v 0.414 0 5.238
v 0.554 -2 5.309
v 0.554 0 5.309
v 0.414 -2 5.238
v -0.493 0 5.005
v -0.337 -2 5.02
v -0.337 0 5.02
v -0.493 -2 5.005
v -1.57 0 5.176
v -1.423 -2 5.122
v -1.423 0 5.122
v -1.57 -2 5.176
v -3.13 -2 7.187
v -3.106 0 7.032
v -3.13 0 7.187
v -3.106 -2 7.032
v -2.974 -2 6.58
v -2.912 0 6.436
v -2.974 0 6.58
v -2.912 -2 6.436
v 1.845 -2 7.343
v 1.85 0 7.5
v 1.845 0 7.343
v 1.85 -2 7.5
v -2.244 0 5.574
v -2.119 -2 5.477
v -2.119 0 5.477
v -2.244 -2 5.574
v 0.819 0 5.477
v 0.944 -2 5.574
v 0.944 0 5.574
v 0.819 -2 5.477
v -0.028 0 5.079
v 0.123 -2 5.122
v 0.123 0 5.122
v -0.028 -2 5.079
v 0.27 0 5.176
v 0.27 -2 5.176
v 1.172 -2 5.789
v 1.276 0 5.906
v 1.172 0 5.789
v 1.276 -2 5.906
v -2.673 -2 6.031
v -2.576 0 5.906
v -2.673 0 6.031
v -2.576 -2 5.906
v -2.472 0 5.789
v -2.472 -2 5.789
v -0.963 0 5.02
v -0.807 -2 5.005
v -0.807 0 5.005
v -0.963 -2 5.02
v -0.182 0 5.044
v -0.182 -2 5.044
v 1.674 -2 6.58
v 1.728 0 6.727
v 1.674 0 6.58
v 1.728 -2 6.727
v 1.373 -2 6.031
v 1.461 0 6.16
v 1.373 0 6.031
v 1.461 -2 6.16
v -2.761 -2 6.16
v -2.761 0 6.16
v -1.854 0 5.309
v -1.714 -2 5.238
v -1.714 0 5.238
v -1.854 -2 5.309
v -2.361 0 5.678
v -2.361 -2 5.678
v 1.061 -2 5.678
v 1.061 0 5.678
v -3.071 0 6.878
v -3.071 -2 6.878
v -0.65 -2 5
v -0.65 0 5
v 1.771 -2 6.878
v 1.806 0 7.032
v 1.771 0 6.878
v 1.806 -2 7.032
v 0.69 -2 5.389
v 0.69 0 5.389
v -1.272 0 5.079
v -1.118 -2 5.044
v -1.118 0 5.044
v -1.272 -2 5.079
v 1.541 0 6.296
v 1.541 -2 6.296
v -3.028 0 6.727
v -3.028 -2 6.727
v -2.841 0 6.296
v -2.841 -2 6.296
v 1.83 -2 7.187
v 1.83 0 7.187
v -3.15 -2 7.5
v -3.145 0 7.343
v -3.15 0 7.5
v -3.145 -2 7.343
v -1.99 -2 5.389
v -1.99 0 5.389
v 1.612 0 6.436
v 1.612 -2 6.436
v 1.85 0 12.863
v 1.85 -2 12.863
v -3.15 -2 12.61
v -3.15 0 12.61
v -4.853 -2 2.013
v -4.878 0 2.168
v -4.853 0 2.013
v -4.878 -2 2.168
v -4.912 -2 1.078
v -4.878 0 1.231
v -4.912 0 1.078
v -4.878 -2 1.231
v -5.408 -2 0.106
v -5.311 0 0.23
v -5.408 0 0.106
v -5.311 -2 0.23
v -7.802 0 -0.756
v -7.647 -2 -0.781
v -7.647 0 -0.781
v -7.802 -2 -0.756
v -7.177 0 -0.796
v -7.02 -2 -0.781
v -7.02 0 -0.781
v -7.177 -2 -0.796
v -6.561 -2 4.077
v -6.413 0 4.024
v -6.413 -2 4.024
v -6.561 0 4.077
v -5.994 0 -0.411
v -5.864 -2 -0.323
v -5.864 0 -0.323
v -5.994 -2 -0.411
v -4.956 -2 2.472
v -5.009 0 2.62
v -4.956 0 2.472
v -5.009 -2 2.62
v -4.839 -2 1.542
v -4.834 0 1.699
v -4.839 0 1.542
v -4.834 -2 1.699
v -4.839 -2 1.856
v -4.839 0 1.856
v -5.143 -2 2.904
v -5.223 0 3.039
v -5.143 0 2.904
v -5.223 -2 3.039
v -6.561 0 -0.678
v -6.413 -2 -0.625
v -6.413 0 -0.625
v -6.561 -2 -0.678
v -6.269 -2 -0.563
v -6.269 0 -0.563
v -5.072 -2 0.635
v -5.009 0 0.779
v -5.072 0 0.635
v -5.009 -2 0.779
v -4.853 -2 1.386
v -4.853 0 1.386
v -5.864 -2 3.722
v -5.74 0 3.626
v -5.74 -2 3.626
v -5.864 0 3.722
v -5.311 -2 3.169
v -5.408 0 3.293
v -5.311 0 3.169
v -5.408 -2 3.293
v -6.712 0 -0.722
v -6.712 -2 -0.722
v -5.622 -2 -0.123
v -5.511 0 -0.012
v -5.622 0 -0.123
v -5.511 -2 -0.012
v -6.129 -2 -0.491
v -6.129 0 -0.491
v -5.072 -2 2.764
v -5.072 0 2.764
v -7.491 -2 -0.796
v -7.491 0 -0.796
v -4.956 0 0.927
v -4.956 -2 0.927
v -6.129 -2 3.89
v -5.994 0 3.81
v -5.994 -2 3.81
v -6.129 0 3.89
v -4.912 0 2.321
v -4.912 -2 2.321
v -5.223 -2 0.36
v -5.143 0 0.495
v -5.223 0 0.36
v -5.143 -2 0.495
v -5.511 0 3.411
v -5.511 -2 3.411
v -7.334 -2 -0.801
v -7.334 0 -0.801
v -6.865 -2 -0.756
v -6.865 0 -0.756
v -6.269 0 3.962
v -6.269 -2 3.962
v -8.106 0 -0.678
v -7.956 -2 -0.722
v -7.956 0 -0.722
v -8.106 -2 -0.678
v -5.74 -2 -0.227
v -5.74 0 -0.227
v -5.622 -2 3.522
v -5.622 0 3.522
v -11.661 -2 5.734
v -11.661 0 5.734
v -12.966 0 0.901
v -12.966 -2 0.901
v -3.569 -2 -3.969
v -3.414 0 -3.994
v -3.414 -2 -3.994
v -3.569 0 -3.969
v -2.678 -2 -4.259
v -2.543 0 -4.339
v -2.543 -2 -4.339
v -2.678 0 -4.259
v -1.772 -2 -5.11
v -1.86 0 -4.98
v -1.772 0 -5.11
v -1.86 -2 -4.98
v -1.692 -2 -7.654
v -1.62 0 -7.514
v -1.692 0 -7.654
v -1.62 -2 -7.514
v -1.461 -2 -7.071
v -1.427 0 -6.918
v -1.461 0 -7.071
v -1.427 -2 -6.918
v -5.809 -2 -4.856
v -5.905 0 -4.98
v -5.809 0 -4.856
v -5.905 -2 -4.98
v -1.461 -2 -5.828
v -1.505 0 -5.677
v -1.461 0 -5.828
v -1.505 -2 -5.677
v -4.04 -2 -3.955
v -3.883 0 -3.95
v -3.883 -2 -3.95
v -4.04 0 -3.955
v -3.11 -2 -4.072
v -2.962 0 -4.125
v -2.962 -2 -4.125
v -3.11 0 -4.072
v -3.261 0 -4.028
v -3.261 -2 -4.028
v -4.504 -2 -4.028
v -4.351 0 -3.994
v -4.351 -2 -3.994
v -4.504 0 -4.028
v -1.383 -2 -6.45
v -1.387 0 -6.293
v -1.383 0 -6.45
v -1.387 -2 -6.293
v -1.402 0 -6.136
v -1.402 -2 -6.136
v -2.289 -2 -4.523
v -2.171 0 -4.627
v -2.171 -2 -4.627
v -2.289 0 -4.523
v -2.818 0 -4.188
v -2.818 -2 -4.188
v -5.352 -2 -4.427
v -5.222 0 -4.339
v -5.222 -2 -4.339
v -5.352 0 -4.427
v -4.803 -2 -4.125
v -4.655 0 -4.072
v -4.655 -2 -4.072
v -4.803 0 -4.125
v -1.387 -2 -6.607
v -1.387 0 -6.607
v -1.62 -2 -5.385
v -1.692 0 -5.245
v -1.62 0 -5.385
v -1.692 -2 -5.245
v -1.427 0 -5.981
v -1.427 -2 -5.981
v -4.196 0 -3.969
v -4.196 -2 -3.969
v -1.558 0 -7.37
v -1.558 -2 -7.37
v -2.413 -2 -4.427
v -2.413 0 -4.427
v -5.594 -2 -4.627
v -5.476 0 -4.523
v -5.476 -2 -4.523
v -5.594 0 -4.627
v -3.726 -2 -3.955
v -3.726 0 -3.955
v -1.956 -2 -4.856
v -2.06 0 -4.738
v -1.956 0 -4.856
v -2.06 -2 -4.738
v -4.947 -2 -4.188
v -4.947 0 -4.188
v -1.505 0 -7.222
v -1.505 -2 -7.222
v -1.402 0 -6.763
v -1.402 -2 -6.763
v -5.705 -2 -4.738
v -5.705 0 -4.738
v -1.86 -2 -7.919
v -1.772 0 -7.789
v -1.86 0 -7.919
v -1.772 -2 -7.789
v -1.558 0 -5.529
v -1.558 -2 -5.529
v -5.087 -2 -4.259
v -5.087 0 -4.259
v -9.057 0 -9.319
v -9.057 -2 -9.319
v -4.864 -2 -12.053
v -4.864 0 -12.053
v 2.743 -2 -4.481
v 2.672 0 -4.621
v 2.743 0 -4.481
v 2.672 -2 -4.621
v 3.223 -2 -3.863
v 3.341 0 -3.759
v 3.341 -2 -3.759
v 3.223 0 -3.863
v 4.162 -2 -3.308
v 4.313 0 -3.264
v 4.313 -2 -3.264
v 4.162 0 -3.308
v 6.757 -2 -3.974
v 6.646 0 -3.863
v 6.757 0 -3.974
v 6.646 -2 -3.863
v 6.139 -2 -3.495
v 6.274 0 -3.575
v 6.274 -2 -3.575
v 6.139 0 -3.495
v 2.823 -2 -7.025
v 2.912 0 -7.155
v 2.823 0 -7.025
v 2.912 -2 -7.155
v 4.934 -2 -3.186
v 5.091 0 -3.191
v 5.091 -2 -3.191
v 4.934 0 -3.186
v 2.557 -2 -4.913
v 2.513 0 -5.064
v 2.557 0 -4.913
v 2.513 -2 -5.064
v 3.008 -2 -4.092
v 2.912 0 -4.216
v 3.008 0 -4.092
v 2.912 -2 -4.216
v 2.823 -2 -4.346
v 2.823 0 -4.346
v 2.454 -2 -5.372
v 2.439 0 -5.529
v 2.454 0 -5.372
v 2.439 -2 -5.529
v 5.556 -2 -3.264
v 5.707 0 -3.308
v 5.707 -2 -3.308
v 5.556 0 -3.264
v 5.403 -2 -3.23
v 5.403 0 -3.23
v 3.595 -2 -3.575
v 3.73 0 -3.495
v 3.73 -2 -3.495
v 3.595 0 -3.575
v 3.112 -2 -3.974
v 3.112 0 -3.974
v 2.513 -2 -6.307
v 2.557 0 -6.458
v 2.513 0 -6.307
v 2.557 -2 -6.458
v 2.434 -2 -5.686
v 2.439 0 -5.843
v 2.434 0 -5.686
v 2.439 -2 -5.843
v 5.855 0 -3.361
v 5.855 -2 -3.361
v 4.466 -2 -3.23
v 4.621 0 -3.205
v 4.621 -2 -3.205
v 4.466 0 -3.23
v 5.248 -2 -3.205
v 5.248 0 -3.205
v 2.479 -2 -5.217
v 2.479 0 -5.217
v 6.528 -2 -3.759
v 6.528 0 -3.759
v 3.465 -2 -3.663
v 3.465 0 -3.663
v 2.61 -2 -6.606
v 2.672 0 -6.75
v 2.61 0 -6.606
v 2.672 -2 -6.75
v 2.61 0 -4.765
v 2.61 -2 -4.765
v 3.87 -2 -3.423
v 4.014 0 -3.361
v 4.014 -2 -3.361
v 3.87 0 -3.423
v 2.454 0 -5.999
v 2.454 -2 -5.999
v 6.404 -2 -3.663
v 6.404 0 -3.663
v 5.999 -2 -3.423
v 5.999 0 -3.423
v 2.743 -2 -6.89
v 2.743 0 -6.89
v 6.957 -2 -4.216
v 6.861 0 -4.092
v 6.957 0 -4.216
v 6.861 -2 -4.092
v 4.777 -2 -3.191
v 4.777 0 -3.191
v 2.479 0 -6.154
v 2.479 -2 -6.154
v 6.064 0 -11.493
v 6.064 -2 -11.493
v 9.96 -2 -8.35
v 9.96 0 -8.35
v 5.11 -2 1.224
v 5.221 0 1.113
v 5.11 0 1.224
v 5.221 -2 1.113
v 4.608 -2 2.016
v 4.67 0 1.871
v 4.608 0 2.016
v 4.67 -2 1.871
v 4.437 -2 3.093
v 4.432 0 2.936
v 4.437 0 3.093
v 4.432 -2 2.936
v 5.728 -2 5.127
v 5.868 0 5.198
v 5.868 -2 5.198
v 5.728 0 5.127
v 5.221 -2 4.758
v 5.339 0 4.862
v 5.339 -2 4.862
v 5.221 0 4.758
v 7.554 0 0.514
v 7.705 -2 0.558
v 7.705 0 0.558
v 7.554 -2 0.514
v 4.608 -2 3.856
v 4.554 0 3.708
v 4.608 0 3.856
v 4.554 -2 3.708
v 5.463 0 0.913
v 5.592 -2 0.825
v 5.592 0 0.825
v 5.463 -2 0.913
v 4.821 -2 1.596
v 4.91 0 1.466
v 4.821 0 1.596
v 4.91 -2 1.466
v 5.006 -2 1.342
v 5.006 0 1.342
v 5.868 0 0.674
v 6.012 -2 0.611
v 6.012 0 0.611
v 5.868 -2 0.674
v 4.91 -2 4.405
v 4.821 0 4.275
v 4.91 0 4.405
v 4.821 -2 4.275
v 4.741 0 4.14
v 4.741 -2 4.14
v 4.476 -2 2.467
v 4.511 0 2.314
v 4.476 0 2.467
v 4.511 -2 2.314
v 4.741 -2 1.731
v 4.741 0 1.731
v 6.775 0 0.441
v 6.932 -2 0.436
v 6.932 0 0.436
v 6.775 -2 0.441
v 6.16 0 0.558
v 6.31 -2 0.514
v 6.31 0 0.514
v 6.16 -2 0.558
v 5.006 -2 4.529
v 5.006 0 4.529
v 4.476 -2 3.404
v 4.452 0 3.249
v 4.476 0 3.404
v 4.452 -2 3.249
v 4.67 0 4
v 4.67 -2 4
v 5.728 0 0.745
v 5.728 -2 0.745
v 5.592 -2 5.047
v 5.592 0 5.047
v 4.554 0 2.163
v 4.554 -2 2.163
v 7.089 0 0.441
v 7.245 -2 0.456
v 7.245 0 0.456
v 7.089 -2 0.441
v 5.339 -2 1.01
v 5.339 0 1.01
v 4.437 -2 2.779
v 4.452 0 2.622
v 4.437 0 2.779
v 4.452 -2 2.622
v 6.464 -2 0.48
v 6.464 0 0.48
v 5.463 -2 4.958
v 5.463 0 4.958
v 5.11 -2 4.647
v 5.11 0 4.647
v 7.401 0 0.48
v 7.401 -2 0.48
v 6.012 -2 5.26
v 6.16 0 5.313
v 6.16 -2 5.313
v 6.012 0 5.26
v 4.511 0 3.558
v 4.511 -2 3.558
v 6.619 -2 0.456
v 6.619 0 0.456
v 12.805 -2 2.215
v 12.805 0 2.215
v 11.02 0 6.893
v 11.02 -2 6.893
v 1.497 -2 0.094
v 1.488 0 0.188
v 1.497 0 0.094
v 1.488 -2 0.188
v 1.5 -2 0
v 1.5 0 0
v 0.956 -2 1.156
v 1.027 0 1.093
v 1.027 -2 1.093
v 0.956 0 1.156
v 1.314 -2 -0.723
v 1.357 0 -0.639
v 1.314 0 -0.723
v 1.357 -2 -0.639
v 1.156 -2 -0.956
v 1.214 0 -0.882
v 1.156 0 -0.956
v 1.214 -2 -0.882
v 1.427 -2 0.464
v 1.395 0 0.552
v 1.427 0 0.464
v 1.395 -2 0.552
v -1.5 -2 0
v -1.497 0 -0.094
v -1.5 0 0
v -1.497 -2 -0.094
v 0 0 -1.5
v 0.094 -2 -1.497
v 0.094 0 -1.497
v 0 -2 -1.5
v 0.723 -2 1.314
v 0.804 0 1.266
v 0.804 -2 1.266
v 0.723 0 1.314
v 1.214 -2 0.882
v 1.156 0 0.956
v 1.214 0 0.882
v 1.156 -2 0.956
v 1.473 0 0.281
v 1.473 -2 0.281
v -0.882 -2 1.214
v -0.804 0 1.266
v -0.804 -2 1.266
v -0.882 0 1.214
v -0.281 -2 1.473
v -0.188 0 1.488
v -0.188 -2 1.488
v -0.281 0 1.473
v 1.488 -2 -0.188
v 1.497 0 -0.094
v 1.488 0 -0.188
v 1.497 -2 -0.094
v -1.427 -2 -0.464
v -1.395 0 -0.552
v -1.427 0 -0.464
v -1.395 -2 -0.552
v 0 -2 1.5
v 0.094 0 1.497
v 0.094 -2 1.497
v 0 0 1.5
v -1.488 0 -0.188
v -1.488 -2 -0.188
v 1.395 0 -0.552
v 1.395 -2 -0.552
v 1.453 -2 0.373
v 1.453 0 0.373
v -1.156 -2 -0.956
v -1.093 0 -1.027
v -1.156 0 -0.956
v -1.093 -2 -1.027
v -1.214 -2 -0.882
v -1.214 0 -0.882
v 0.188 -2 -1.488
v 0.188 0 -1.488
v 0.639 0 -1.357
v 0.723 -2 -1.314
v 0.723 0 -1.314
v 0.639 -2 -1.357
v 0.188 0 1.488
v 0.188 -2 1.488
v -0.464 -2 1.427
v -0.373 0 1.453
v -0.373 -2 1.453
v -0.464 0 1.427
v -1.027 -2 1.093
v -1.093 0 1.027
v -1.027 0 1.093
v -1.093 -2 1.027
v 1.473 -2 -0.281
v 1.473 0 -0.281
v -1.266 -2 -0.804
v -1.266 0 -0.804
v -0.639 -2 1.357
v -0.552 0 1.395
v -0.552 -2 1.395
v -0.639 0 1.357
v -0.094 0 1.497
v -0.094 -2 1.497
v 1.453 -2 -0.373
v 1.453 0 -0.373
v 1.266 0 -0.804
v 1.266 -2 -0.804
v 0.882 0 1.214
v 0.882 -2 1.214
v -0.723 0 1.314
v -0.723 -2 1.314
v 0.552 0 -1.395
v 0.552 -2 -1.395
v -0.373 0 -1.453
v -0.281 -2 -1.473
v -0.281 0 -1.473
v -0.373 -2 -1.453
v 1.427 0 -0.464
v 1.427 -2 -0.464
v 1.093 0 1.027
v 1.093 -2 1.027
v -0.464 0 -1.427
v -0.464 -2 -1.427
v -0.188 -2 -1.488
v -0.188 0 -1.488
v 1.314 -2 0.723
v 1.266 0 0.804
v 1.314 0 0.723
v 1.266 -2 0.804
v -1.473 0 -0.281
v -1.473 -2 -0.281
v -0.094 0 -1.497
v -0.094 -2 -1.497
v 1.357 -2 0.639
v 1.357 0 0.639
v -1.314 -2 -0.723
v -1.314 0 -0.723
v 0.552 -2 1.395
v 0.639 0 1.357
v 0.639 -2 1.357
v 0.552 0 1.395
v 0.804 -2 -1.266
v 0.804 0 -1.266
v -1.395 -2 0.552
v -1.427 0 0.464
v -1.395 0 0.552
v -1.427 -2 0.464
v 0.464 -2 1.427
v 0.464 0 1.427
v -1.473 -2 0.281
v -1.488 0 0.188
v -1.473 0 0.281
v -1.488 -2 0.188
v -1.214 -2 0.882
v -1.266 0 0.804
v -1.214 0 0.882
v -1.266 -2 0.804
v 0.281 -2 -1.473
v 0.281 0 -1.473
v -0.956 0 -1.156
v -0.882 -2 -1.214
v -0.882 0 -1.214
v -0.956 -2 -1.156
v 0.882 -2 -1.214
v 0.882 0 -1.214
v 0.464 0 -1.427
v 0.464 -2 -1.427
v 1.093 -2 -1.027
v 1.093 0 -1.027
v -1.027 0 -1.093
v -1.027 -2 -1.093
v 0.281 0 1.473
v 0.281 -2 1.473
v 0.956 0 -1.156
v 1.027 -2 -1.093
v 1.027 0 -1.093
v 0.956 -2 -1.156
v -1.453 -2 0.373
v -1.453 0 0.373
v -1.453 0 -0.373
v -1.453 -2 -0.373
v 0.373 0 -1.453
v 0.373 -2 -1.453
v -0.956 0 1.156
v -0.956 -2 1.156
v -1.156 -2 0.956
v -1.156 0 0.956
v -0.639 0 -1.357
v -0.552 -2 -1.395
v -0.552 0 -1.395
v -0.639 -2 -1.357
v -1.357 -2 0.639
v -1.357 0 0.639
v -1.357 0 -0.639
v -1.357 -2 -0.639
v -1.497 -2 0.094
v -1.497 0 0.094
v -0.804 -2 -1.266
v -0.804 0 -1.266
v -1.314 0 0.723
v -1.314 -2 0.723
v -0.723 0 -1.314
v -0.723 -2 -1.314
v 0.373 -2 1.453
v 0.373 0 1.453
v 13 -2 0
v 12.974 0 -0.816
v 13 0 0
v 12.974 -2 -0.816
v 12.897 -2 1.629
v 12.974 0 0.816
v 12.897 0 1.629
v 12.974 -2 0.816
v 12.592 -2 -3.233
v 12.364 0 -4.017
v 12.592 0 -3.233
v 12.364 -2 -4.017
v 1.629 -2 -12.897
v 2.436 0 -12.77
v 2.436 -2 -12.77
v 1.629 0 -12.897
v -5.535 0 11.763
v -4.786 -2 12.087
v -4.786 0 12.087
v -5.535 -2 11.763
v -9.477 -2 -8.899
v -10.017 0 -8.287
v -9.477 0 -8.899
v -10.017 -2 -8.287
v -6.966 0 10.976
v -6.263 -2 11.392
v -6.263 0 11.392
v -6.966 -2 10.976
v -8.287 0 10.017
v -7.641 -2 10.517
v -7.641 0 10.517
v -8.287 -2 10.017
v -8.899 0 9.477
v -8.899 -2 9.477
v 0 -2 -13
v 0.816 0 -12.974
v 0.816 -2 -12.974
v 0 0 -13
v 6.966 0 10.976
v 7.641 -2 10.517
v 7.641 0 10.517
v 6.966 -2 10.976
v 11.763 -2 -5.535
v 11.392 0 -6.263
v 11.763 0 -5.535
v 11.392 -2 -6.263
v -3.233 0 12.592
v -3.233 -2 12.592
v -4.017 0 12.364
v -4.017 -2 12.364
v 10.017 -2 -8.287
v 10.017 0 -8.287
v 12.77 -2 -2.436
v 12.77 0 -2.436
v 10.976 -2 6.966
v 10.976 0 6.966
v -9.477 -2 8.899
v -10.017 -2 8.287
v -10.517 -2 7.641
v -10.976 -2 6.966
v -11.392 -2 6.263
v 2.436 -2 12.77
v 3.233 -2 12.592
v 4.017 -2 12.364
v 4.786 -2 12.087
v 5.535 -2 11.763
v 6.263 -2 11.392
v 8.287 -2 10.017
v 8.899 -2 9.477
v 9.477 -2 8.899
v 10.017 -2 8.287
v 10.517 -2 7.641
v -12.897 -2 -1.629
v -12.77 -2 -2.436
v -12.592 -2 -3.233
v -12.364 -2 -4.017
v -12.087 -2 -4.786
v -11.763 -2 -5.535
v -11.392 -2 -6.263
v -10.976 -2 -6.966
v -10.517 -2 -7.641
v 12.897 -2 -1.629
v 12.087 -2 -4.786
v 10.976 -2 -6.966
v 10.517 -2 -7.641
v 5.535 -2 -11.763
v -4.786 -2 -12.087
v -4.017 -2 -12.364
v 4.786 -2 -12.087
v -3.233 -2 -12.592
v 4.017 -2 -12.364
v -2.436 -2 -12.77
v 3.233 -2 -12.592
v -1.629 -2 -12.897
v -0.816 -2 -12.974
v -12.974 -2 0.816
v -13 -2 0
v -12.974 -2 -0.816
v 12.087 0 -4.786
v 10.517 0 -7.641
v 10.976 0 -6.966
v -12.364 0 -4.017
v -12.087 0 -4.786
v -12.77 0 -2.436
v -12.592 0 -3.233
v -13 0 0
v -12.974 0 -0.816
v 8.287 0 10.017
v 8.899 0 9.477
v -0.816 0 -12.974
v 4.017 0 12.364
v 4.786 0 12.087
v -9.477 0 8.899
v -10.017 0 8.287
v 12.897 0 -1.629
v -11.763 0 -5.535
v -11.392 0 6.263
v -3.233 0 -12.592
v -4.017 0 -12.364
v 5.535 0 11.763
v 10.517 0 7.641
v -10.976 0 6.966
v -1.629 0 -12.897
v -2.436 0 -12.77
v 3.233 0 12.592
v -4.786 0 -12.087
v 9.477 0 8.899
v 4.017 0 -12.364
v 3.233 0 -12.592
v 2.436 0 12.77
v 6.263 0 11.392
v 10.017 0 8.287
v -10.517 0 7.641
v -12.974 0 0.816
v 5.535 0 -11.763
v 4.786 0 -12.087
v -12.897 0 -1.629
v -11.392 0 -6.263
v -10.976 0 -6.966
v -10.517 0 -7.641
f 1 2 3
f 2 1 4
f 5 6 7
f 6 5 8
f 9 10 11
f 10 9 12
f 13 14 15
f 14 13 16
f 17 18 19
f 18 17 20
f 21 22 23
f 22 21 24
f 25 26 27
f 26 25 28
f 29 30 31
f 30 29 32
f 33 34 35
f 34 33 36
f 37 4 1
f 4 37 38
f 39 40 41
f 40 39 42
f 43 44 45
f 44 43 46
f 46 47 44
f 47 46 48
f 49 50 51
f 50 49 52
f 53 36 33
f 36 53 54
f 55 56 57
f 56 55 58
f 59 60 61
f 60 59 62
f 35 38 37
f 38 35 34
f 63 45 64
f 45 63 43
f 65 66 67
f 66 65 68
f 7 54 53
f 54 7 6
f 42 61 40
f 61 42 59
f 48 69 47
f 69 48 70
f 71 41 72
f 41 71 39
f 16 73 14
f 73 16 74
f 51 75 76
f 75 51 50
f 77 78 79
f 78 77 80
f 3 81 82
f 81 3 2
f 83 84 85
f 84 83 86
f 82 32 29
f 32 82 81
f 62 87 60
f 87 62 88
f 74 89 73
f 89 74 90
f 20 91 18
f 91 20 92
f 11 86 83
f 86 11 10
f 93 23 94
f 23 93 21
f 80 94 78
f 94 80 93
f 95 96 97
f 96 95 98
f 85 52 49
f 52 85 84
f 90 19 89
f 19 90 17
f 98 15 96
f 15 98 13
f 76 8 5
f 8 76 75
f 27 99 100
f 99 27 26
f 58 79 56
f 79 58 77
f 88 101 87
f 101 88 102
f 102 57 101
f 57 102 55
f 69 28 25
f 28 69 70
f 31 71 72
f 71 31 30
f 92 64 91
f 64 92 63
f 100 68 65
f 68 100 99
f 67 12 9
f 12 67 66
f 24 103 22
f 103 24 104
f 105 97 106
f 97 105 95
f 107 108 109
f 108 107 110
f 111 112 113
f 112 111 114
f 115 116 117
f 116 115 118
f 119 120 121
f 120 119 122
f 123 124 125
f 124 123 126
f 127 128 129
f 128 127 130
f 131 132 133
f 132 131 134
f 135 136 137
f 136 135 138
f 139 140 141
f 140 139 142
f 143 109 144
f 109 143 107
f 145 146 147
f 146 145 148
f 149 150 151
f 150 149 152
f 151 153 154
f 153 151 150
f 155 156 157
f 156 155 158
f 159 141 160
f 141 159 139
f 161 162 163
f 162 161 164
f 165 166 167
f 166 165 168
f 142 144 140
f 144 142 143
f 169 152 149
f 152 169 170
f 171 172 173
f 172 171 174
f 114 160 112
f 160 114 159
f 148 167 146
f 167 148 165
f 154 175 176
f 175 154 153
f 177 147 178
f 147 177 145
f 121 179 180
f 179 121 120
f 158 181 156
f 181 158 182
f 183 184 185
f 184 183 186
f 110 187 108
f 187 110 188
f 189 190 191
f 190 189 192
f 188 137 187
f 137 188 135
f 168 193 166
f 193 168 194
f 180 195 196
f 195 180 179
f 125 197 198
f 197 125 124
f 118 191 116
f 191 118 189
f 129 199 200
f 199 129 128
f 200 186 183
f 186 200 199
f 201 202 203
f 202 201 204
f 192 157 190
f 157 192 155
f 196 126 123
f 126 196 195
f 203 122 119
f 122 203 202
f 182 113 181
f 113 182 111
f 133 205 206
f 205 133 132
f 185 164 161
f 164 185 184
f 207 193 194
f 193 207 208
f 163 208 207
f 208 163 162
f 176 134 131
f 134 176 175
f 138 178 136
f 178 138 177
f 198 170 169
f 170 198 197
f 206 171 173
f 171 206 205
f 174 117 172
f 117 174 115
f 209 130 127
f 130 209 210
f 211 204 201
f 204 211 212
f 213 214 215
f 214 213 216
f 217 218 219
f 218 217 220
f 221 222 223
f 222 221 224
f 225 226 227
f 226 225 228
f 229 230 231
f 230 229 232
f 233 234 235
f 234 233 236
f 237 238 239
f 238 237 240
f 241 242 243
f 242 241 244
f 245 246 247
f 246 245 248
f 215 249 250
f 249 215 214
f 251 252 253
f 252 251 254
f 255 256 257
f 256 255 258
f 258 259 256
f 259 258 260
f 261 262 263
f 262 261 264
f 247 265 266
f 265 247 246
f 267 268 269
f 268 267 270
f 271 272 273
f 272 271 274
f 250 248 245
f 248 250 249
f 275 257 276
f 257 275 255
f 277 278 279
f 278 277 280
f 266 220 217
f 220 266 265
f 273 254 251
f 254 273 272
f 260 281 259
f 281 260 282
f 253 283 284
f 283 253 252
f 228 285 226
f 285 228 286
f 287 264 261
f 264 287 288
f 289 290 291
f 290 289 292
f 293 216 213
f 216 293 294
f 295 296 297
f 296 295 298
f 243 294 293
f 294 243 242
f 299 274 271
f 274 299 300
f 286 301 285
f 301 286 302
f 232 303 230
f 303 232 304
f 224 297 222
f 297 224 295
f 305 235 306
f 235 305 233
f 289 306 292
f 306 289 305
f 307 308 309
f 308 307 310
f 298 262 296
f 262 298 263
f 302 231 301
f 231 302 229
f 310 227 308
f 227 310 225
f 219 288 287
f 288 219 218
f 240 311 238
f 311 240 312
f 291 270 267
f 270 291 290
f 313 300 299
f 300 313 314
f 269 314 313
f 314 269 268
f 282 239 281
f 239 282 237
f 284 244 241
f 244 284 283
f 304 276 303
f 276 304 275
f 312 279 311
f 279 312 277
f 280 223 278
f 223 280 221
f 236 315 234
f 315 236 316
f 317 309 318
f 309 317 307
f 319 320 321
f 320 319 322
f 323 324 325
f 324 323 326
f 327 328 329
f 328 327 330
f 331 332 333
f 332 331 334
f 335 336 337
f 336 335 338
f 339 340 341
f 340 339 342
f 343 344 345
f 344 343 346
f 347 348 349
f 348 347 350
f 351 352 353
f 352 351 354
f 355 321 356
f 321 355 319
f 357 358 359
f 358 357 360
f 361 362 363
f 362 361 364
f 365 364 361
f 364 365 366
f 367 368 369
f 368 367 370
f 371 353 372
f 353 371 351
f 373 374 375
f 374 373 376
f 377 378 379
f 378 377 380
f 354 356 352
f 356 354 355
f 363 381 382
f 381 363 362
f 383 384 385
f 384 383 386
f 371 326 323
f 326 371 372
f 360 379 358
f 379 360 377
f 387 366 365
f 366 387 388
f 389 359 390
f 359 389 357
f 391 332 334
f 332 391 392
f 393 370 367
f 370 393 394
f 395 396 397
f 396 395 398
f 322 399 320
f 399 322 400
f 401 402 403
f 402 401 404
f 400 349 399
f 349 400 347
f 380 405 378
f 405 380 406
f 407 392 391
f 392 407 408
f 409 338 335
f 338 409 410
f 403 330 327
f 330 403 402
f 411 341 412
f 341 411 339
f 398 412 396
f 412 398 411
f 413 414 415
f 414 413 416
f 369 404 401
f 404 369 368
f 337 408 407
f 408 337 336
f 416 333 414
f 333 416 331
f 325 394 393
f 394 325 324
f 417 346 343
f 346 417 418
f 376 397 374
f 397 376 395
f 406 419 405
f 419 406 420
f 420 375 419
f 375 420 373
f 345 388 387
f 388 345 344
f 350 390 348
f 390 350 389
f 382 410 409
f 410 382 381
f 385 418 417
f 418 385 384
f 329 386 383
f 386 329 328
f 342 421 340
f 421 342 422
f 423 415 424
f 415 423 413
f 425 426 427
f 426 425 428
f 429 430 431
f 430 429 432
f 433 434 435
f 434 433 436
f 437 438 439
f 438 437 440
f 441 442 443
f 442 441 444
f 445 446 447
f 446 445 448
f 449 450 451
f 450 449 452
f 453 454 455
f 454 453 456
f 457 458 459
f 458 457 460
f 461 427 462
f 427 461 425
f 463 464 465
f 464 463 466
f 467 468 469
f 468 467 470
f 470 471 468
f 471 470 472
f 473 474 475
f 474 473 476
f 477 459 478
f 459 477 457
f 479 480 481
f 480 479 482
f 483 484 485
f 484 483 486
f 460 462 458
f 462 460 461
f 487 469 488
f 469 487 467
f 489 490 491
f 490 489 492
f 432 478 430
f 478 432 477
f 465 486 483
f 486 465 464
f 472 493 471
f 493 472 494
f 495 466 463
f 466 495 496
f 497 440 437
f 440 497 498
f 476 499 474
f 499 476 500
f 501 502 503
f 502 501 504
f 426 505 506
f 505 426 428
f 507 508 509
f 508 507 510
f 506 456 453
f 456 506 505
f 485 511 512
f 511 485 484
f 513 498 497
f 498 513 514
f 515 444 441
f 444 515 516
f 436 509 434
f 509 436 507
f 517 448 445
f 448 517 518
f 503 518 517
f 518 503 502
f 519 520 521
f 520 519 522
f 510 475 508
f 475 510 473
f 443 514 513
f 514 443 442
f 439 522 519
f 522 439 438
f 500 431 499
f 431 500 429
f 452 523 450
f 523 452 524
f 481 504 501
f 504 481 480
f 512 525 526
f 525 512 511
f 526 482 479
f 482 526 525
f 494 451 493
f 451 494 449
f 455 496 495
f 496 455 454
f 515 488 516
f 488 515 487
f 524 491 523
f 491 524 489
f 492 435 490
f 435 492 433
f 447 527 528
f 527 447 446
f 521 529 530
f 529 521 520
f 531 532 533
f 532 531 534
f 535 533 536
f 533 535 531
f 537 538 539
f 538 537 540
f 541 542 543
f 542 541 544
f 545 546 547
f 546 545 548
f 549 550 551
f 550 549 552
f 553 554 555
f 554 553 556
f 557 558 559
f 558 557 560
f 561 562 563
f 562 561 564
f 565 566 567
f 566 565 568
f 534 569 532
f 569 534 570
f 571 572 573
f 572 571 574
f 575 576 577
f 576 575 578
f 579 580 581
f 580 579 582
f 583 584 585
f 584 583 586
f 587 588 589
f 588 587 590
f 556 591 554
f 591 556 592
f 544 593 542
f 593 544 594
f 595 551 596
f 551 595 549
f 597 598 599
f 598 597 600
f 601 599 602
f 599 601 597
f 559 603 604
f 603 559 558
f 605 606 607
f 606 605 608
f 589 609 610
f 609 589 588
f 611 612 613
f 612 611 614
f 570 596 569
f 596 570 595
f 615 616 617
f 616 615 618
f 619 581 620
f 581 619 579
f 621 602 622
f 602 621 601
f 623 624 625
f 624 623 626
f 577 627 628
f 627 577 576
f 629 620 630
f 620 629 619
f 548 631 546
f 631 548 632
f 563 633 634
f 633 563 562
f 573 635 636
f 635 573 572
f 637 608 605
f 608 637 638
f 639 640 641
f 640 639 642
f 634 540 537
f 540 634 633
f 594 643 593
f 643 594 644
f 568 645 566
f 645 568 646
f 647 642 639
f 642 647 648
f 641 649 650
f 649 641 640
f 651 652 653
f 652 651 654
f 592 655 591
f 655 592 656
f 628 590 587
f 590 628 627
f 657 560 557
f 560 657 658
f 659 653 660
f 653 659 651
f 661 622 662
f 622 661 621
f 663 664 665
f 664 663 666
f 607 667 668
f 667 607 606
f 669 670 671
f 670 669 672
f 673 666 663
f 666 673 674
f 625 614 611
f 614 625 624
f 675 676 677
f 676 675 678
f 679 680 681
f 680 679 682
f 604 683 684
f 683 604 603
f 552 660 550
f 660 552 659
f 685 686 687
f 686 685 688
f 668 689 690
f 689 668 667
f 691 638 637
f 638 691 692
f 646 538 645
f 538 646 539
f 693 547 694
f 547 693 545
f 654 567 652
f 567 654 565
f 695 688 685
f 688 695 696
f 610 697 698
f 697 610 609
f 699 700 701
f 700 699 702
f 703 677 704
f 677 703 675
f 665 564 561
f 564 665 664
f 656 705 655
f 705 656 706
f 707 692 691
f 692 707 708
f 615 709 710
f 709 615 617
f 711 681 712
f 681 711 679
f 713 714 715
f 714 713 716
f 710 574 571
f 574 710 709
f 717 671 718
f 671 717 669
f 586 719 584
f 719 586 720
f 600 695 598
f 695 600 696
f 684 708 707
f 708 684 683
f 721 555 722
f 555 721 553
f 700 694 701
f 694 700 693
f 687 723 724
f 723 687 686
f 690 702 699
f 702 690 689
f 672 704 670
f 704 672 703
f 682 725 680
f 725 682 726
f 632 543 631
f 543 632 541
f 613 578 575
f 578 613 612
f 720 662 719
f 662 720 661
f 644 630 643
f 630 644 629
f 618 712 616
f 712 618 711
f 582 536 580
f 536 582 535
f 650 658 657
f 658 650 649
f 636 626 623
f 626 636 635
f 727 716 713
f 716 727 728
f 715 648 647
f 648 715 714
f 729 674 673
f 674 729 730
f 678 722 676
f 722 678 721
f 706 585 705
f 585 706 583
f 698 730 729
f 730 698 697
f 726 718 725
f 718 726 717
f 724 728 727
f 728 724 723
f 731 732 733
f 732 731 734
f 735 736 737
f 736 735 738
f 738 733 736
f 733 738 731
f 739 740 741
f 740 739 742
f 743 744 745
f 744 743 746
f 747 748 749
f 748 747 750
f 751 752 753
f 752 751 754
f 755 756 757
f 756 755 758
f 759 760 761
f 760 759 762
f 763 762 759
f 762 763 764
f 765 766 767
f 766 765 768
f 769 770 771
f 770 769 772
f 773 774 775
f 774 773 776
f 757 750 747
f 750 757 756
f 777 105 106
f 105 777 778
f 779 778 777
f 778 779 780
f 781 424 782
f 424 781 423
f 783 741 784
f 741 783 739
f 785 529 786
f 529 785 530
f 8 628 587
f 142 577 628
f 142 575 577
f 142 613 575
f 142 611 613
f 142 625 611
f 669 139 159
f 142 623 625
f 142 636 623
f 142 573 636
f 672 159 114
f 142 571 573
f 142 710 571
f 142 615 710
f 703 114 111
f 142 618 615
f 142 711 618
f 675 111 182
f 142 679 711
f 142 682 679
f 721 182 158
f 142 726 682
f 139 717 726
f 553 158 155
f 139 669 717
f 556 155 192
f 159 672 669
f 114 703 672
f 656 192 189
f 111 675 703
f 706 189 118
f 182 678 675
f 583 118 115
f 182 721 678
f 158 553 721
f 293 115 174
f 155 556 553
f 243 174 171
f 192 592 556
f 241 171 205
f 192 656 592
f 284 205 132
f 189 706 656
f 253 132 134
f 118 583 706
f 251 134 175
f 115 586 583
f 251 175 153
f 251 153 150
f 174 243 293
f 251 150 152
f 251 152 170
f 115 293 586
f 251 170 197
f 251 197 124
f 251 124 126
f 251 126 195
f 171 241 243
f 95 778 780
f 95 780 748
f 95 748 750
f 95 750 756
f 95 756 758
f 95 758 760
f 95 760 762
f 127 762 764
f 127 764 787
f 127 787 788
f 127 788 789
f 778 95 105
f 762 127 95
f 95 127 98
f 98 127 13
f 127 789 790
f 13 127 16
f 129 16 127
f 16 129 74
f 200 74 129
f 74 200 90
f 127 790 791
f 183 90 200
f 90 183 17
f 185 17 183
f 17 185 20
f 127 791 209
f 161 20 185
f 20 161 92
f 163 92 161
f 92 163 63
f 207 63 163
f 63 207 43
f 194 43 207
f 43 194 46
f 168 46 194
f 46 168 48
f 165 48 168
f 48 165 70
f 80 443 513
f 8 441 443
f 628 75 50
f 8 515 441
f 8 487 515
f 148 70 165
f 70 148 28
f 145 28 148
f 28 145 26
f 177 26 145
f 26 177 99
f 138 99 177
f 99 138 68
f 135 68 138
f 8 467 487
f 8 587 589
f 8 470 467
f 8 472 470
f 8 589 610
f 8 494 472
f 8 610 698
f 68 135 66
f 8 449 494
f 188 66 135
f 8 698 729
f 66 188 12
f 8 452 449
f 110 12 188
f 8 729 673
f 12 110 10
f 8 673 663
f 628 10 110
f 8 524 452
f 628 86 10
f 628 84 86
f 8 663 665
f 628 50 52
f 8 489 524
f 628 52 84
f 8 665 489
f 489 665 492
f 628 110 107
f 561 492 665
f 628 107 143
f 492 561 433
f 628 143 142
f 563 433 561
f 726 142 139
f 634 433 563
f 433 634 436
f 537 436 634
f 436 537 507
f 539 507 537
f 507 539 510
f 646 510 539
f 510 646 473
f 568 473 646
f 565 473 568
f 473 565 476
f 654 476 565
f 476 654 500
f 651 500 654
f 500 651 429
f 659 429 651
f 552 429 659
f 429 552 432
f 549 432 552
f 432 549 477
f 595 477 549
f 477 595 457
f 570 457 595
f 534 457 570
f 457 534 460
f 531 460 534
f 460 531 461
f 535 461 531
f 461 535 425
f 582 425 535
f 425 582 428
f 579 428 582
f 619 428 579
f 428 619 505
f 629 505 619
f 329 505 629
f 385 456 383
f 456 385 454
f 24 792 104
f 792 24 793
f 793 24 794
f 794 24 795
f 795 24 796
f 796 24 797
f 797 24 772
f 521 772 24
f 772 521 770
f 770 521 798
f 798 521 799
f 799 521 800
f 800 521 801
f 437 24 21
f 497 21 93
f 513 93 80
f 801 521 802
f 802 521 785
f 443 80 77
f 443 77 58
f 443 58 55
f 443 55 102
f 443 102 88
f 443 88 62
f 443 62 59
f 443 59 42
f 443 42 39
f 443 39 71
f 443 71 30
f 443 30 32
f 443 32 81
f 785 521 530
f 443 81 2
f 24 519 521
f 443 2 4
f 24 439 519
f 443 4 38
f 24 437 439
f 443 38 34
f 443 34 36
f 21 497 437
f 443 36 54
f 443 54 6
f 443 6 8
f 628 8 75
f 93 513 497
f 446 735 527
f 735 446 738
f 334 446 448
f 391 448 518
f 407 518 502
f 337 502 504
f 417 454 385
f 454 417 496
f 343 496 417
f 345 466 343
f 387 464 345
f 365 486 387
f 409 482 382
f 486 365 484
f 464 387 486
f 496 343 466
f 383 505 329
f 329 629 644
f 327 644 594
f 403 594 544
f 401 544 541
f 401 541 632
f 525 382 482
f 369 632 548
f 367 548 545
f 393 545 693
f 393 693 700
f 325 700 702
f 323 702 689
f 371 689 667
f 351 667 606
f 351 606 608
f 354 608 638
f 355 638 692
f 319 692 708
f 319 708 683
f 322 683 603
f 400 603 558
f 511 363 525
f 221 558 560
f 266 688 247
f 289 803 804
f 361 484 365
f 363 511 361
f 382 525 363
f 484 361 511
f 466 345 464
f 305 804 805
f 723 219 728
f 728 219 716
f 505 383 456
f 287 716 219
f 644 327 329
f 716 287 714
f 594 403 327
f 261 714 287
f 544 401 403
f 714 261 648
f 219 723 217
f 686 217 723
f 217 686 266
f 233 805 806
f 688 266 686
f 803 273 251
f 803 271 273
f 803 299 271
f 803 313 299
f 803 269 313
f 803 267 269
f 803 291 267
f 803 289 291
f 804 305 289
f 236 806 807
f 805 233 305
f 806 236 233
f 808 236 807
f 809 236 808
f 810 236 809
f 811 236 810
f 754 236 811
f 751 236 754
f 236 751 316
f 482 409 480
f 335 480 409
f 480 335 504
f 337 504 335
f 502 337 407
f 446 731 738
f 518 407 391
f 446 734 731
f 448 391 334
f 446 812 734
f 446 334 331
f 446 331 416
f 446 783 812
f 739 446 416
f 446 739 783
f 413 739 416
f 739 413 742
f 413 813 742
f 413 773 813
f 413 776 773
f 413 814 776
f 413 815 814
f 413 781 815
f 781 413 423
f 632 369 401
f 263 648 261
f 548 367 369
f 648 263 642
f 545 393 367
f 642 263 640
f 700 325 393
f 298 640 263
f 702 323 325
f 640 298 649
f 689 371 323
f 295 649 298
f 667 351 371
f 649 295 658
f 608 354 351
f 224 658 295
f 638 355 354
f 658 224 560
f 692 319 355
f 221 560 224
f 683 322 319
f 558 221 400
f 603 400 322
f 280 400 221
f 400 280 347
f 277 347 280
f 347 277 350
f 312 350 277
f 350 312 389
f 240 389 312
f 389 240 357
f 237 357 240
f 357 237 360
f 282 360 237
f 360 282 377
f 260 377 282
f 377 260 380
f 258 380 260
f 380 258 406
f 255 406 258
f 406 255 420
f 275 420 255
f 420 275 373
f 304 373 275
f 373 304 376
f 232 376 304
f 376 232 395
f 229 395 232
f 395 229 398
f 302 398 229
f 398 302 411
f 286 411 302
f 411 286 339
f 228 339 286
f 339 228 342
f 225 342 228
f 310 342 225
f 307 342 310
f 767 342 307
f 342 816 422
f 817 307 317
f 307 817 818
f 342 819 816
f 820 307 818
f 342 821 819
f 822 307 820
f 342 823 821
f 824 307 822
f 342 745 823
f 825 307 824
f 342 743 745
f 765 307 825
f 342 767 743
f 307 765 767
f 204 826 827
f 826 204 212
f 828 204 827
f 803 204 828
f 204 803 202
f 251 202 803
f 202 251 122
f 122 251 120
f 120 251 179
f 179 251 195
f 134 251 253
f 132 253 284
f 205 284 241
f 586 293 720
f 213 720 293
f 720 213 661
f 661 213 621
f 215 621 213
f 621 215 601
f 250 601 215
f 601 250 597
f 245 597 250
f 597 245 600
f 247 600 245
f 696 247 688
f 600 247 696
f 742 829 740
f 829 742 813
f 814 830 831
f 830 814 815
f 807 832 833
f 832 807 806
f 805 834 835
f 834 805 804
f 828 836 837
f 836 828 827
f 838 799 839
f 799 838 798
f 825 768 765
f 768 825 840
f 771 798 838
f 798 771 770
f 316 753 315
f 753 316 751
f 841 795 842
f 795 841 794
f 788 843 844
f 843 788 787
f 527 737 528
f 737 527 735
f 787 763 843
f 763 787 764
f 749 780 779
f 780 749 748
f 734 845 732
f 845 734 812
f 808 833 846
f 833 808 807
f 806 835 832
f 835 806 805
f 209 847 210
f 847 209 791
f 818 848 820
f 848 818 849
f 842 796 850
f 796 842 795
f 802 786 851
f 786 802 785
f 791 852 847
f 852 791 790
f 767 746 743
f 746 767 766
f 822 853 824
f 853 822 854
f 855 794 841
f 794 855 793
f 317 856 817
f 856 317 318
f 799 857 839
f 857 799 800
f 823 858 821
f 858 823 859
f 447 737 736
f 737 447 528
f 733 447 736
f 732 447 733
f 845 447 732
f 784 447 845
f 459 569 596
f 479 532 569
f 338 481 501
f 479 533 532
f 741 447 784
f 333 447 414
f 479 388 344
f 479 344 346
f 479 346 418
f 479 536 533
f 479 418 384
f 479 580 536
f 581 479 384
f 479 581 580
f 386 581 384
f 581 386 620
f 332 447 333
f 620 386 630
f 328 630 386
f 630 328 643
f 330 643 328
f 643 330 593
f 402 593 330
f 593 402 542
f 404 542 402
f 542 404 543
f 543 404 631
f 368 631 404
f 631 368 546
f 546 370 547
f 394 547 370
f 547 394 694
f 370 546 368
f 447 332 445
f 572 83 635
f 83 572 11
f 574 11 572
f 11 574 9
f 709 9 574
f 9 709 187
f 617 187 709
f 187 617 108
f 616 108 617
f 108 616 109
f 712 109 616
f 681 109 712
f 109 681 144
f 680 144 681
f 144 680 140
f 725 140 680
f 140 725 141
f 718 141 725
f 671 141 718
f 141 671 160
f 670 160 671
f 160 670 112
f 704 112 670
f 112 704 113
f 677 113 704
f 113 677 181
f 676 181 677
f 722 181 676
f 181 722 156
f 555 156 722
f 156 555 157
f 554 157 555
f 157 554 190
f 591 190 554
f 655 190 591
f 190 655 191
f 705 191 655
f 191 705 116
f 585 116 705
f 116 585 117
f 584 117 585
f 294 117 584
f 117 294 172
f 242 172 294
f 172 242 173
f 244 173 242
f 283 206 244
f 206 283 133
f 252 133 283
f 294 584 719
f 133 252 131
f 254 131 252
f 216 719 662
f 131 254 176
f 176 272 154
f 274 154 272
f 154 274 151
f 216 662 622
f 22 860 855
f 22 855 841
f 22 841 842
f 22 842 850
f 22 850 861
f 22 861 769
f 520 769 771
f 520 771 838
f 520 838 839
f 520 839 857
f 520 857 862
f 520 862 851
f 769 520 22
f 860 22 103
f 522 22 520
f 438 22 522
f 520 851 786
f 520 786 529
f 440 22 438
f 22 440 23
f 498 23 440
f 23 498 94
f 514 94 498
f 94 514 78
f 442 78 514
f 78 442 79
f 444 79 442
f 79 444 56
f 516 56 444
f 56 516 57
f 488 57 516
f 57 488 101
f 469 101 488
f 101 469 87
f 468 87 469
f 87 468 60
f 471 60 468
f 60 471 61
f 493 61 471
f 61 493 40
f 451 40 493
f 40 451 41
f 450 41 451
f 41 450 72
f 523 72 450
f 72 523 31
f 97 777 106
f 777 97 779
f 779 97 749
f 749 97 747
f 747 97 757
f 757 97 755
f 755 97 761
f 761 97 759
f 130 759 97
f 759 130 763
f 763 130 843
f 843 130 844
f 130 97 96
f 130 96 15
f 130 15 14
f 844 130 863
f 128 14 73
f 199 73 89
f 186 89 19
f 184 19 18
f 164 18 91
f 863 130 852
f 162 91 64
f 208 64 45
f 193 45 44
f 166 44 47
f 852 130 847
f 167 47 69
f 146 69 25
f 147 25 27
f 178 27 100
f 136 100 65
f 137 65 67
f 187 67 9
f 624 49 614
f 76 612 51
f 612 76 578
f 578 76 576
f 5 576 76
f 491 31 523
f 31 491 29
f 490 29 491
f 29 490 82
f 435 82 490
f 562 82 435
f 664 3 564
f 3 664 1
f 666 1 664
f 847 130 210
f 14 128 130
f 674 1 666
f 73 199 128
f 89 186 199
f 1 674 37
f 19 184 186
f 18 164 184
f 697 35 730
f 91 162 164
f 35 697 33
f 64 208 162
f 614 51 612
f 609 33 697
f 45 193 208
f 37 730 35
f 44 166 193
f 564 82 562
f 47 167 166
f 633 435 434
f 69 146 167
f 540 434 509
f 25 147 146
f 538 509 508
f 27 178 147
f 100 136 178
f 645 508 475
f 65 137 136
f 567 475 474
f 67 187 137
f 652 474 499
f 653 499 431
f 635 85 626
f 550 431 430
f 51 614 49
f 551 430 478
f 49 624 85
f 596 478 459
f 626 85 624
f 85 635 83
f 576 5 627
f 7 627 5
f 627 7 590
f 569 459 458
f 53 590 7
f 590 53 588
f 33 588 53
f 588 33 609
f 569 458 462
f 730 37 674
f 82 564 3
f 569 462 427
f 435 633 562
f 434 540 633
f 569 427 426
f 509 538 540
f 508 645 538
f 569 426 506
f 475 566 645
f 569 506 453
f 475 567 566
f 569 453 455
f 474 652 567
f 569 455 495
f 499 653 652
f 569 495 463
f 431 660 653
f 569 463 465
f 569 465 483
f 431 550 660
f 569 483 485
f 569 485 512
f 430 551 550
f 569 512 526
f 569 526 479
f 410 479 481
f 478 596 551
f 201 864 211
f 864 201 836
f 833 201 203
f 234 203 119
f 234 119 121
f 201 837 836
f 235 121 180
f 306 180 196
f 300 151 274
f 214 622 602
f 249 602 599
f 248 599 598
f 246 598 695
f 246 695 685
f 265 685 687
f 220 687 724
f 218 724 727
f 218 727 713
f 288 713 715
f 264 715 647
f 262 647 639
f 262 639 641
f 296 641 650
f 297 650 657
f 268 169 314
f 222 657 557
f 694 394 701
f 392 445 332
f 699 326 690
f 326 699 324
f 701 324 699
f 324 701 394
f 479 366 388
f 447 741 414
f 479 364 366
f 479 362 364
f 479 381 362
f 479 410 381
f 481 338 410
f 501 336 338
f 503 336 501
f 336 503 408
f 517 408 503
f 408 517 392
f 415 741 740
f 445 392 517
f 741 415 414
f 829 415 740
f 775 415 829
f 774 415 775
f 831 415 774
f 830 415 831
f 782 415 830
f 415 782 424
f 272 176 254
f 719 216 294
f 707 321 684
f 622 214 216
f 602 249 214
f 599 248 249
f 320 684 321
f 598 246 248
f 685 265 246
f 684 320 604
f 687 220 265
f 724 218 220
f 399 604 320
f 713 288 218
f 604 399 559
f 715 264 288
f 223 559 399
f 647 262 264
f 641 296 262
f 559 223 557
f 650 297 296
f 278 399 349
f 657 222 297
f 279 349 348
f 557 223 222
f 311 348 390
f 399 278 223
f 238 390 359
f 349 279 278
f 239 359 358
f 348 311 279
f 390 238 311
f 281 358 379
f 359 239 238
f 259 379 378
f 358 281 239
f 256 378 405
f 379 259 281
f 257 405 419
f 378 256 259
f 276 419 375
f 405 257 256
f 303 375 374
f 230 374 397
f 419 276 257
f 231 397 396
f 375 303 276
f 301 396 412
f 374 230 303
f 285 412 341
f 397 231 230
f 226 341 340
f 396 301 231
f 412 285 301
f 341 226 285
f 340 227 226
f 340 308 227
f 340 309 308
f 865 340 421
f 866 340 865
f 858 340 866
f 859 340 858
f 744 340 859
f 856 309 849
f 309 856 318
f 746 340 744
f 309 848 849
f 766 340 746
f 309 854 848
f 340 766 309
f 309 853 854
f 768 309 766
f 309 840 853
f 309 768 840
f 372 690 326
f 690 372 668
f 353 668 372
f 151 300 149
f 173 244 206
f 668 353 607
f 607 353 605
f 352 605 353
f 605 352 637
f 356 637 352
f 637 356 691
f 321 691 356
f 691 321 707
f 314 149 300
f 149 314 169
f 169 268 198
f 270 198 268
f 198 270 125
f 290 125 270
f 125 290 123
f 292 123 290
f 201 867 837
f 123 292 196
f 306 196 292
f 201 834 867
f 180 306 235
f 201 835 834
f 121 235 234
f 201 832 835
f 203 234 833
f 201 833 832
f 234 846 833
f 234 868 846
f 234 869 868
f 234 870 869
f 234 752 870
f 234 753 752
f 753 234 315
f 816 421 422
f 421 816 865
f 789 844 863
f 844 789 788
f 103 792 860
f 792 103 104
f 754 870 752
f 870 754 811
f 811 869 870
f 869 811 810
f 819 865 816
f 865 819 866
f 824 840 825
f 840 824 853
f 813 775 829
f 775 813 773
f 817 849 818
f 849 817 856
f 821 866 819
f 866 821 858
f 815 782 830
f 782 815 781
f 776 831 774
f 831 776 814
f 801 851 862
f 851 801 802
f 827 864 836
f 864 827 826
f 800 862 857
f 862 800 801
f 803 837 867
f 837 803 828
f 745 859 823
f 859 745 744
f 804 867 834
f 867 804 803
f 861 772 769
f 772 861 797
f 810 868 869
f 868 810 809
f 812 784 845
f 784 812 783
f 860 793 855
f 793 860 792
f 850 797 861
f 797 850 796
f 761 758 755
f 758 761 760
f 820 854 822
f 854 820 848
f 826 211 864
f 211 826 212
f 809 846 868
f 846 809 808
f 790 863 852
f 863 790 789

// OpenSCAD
 diameter = 26;
 binnen_diameter_gaten = 10;
 buiten_diameter_gaten = 23;
 gat_dikte=1.3;
 diepte=2;
 aantal_gaten=5;
 buitenste_gaten_diameter = 5;
 difference(){
   union(){
       
        translate([0,0,0]){
            rotate([90,0,00]){
              cylinder(h=diepte, r=diameter/2, $fn=100, center=false);
            }
        }          


        

    }
    union() {

        translate([0,1,0]){
            rotate([90,0,0]){
              cylinder(h=99, r=1.5, $fn=100, center=false);
            }
        }  

        //gaten
        translate([0,0,0]){
            rotate([90,0,0]){
                for (hoek =[0:360/aantal_gaten:360])
                rotate([0,0,hoek]){
                    translate([-gat_dikte/2,0,-2]){
                        rotate([0,0,0]){
                            translate([0,binnen_diameter_gaten/2+buitenste_gaten_diameter/2,0]){
                                cylinder(h=99, r=buitenste_gaten_diameter/2, $fn=100, center=false);
                                
                            }
                            translate([-buitenste_gaten_diameter/2,binnen_diameter_gaten/2+buitenste_gaten_diameter/2,0]){
                                cube([buitenste_gaten_diameter,(buiten_diameter_gaten-binnen_diameter_gaten)/2+2,diepte+3], center=false);
                                
                            }
                        }
                    }
                }
            }
        }


    }
}
